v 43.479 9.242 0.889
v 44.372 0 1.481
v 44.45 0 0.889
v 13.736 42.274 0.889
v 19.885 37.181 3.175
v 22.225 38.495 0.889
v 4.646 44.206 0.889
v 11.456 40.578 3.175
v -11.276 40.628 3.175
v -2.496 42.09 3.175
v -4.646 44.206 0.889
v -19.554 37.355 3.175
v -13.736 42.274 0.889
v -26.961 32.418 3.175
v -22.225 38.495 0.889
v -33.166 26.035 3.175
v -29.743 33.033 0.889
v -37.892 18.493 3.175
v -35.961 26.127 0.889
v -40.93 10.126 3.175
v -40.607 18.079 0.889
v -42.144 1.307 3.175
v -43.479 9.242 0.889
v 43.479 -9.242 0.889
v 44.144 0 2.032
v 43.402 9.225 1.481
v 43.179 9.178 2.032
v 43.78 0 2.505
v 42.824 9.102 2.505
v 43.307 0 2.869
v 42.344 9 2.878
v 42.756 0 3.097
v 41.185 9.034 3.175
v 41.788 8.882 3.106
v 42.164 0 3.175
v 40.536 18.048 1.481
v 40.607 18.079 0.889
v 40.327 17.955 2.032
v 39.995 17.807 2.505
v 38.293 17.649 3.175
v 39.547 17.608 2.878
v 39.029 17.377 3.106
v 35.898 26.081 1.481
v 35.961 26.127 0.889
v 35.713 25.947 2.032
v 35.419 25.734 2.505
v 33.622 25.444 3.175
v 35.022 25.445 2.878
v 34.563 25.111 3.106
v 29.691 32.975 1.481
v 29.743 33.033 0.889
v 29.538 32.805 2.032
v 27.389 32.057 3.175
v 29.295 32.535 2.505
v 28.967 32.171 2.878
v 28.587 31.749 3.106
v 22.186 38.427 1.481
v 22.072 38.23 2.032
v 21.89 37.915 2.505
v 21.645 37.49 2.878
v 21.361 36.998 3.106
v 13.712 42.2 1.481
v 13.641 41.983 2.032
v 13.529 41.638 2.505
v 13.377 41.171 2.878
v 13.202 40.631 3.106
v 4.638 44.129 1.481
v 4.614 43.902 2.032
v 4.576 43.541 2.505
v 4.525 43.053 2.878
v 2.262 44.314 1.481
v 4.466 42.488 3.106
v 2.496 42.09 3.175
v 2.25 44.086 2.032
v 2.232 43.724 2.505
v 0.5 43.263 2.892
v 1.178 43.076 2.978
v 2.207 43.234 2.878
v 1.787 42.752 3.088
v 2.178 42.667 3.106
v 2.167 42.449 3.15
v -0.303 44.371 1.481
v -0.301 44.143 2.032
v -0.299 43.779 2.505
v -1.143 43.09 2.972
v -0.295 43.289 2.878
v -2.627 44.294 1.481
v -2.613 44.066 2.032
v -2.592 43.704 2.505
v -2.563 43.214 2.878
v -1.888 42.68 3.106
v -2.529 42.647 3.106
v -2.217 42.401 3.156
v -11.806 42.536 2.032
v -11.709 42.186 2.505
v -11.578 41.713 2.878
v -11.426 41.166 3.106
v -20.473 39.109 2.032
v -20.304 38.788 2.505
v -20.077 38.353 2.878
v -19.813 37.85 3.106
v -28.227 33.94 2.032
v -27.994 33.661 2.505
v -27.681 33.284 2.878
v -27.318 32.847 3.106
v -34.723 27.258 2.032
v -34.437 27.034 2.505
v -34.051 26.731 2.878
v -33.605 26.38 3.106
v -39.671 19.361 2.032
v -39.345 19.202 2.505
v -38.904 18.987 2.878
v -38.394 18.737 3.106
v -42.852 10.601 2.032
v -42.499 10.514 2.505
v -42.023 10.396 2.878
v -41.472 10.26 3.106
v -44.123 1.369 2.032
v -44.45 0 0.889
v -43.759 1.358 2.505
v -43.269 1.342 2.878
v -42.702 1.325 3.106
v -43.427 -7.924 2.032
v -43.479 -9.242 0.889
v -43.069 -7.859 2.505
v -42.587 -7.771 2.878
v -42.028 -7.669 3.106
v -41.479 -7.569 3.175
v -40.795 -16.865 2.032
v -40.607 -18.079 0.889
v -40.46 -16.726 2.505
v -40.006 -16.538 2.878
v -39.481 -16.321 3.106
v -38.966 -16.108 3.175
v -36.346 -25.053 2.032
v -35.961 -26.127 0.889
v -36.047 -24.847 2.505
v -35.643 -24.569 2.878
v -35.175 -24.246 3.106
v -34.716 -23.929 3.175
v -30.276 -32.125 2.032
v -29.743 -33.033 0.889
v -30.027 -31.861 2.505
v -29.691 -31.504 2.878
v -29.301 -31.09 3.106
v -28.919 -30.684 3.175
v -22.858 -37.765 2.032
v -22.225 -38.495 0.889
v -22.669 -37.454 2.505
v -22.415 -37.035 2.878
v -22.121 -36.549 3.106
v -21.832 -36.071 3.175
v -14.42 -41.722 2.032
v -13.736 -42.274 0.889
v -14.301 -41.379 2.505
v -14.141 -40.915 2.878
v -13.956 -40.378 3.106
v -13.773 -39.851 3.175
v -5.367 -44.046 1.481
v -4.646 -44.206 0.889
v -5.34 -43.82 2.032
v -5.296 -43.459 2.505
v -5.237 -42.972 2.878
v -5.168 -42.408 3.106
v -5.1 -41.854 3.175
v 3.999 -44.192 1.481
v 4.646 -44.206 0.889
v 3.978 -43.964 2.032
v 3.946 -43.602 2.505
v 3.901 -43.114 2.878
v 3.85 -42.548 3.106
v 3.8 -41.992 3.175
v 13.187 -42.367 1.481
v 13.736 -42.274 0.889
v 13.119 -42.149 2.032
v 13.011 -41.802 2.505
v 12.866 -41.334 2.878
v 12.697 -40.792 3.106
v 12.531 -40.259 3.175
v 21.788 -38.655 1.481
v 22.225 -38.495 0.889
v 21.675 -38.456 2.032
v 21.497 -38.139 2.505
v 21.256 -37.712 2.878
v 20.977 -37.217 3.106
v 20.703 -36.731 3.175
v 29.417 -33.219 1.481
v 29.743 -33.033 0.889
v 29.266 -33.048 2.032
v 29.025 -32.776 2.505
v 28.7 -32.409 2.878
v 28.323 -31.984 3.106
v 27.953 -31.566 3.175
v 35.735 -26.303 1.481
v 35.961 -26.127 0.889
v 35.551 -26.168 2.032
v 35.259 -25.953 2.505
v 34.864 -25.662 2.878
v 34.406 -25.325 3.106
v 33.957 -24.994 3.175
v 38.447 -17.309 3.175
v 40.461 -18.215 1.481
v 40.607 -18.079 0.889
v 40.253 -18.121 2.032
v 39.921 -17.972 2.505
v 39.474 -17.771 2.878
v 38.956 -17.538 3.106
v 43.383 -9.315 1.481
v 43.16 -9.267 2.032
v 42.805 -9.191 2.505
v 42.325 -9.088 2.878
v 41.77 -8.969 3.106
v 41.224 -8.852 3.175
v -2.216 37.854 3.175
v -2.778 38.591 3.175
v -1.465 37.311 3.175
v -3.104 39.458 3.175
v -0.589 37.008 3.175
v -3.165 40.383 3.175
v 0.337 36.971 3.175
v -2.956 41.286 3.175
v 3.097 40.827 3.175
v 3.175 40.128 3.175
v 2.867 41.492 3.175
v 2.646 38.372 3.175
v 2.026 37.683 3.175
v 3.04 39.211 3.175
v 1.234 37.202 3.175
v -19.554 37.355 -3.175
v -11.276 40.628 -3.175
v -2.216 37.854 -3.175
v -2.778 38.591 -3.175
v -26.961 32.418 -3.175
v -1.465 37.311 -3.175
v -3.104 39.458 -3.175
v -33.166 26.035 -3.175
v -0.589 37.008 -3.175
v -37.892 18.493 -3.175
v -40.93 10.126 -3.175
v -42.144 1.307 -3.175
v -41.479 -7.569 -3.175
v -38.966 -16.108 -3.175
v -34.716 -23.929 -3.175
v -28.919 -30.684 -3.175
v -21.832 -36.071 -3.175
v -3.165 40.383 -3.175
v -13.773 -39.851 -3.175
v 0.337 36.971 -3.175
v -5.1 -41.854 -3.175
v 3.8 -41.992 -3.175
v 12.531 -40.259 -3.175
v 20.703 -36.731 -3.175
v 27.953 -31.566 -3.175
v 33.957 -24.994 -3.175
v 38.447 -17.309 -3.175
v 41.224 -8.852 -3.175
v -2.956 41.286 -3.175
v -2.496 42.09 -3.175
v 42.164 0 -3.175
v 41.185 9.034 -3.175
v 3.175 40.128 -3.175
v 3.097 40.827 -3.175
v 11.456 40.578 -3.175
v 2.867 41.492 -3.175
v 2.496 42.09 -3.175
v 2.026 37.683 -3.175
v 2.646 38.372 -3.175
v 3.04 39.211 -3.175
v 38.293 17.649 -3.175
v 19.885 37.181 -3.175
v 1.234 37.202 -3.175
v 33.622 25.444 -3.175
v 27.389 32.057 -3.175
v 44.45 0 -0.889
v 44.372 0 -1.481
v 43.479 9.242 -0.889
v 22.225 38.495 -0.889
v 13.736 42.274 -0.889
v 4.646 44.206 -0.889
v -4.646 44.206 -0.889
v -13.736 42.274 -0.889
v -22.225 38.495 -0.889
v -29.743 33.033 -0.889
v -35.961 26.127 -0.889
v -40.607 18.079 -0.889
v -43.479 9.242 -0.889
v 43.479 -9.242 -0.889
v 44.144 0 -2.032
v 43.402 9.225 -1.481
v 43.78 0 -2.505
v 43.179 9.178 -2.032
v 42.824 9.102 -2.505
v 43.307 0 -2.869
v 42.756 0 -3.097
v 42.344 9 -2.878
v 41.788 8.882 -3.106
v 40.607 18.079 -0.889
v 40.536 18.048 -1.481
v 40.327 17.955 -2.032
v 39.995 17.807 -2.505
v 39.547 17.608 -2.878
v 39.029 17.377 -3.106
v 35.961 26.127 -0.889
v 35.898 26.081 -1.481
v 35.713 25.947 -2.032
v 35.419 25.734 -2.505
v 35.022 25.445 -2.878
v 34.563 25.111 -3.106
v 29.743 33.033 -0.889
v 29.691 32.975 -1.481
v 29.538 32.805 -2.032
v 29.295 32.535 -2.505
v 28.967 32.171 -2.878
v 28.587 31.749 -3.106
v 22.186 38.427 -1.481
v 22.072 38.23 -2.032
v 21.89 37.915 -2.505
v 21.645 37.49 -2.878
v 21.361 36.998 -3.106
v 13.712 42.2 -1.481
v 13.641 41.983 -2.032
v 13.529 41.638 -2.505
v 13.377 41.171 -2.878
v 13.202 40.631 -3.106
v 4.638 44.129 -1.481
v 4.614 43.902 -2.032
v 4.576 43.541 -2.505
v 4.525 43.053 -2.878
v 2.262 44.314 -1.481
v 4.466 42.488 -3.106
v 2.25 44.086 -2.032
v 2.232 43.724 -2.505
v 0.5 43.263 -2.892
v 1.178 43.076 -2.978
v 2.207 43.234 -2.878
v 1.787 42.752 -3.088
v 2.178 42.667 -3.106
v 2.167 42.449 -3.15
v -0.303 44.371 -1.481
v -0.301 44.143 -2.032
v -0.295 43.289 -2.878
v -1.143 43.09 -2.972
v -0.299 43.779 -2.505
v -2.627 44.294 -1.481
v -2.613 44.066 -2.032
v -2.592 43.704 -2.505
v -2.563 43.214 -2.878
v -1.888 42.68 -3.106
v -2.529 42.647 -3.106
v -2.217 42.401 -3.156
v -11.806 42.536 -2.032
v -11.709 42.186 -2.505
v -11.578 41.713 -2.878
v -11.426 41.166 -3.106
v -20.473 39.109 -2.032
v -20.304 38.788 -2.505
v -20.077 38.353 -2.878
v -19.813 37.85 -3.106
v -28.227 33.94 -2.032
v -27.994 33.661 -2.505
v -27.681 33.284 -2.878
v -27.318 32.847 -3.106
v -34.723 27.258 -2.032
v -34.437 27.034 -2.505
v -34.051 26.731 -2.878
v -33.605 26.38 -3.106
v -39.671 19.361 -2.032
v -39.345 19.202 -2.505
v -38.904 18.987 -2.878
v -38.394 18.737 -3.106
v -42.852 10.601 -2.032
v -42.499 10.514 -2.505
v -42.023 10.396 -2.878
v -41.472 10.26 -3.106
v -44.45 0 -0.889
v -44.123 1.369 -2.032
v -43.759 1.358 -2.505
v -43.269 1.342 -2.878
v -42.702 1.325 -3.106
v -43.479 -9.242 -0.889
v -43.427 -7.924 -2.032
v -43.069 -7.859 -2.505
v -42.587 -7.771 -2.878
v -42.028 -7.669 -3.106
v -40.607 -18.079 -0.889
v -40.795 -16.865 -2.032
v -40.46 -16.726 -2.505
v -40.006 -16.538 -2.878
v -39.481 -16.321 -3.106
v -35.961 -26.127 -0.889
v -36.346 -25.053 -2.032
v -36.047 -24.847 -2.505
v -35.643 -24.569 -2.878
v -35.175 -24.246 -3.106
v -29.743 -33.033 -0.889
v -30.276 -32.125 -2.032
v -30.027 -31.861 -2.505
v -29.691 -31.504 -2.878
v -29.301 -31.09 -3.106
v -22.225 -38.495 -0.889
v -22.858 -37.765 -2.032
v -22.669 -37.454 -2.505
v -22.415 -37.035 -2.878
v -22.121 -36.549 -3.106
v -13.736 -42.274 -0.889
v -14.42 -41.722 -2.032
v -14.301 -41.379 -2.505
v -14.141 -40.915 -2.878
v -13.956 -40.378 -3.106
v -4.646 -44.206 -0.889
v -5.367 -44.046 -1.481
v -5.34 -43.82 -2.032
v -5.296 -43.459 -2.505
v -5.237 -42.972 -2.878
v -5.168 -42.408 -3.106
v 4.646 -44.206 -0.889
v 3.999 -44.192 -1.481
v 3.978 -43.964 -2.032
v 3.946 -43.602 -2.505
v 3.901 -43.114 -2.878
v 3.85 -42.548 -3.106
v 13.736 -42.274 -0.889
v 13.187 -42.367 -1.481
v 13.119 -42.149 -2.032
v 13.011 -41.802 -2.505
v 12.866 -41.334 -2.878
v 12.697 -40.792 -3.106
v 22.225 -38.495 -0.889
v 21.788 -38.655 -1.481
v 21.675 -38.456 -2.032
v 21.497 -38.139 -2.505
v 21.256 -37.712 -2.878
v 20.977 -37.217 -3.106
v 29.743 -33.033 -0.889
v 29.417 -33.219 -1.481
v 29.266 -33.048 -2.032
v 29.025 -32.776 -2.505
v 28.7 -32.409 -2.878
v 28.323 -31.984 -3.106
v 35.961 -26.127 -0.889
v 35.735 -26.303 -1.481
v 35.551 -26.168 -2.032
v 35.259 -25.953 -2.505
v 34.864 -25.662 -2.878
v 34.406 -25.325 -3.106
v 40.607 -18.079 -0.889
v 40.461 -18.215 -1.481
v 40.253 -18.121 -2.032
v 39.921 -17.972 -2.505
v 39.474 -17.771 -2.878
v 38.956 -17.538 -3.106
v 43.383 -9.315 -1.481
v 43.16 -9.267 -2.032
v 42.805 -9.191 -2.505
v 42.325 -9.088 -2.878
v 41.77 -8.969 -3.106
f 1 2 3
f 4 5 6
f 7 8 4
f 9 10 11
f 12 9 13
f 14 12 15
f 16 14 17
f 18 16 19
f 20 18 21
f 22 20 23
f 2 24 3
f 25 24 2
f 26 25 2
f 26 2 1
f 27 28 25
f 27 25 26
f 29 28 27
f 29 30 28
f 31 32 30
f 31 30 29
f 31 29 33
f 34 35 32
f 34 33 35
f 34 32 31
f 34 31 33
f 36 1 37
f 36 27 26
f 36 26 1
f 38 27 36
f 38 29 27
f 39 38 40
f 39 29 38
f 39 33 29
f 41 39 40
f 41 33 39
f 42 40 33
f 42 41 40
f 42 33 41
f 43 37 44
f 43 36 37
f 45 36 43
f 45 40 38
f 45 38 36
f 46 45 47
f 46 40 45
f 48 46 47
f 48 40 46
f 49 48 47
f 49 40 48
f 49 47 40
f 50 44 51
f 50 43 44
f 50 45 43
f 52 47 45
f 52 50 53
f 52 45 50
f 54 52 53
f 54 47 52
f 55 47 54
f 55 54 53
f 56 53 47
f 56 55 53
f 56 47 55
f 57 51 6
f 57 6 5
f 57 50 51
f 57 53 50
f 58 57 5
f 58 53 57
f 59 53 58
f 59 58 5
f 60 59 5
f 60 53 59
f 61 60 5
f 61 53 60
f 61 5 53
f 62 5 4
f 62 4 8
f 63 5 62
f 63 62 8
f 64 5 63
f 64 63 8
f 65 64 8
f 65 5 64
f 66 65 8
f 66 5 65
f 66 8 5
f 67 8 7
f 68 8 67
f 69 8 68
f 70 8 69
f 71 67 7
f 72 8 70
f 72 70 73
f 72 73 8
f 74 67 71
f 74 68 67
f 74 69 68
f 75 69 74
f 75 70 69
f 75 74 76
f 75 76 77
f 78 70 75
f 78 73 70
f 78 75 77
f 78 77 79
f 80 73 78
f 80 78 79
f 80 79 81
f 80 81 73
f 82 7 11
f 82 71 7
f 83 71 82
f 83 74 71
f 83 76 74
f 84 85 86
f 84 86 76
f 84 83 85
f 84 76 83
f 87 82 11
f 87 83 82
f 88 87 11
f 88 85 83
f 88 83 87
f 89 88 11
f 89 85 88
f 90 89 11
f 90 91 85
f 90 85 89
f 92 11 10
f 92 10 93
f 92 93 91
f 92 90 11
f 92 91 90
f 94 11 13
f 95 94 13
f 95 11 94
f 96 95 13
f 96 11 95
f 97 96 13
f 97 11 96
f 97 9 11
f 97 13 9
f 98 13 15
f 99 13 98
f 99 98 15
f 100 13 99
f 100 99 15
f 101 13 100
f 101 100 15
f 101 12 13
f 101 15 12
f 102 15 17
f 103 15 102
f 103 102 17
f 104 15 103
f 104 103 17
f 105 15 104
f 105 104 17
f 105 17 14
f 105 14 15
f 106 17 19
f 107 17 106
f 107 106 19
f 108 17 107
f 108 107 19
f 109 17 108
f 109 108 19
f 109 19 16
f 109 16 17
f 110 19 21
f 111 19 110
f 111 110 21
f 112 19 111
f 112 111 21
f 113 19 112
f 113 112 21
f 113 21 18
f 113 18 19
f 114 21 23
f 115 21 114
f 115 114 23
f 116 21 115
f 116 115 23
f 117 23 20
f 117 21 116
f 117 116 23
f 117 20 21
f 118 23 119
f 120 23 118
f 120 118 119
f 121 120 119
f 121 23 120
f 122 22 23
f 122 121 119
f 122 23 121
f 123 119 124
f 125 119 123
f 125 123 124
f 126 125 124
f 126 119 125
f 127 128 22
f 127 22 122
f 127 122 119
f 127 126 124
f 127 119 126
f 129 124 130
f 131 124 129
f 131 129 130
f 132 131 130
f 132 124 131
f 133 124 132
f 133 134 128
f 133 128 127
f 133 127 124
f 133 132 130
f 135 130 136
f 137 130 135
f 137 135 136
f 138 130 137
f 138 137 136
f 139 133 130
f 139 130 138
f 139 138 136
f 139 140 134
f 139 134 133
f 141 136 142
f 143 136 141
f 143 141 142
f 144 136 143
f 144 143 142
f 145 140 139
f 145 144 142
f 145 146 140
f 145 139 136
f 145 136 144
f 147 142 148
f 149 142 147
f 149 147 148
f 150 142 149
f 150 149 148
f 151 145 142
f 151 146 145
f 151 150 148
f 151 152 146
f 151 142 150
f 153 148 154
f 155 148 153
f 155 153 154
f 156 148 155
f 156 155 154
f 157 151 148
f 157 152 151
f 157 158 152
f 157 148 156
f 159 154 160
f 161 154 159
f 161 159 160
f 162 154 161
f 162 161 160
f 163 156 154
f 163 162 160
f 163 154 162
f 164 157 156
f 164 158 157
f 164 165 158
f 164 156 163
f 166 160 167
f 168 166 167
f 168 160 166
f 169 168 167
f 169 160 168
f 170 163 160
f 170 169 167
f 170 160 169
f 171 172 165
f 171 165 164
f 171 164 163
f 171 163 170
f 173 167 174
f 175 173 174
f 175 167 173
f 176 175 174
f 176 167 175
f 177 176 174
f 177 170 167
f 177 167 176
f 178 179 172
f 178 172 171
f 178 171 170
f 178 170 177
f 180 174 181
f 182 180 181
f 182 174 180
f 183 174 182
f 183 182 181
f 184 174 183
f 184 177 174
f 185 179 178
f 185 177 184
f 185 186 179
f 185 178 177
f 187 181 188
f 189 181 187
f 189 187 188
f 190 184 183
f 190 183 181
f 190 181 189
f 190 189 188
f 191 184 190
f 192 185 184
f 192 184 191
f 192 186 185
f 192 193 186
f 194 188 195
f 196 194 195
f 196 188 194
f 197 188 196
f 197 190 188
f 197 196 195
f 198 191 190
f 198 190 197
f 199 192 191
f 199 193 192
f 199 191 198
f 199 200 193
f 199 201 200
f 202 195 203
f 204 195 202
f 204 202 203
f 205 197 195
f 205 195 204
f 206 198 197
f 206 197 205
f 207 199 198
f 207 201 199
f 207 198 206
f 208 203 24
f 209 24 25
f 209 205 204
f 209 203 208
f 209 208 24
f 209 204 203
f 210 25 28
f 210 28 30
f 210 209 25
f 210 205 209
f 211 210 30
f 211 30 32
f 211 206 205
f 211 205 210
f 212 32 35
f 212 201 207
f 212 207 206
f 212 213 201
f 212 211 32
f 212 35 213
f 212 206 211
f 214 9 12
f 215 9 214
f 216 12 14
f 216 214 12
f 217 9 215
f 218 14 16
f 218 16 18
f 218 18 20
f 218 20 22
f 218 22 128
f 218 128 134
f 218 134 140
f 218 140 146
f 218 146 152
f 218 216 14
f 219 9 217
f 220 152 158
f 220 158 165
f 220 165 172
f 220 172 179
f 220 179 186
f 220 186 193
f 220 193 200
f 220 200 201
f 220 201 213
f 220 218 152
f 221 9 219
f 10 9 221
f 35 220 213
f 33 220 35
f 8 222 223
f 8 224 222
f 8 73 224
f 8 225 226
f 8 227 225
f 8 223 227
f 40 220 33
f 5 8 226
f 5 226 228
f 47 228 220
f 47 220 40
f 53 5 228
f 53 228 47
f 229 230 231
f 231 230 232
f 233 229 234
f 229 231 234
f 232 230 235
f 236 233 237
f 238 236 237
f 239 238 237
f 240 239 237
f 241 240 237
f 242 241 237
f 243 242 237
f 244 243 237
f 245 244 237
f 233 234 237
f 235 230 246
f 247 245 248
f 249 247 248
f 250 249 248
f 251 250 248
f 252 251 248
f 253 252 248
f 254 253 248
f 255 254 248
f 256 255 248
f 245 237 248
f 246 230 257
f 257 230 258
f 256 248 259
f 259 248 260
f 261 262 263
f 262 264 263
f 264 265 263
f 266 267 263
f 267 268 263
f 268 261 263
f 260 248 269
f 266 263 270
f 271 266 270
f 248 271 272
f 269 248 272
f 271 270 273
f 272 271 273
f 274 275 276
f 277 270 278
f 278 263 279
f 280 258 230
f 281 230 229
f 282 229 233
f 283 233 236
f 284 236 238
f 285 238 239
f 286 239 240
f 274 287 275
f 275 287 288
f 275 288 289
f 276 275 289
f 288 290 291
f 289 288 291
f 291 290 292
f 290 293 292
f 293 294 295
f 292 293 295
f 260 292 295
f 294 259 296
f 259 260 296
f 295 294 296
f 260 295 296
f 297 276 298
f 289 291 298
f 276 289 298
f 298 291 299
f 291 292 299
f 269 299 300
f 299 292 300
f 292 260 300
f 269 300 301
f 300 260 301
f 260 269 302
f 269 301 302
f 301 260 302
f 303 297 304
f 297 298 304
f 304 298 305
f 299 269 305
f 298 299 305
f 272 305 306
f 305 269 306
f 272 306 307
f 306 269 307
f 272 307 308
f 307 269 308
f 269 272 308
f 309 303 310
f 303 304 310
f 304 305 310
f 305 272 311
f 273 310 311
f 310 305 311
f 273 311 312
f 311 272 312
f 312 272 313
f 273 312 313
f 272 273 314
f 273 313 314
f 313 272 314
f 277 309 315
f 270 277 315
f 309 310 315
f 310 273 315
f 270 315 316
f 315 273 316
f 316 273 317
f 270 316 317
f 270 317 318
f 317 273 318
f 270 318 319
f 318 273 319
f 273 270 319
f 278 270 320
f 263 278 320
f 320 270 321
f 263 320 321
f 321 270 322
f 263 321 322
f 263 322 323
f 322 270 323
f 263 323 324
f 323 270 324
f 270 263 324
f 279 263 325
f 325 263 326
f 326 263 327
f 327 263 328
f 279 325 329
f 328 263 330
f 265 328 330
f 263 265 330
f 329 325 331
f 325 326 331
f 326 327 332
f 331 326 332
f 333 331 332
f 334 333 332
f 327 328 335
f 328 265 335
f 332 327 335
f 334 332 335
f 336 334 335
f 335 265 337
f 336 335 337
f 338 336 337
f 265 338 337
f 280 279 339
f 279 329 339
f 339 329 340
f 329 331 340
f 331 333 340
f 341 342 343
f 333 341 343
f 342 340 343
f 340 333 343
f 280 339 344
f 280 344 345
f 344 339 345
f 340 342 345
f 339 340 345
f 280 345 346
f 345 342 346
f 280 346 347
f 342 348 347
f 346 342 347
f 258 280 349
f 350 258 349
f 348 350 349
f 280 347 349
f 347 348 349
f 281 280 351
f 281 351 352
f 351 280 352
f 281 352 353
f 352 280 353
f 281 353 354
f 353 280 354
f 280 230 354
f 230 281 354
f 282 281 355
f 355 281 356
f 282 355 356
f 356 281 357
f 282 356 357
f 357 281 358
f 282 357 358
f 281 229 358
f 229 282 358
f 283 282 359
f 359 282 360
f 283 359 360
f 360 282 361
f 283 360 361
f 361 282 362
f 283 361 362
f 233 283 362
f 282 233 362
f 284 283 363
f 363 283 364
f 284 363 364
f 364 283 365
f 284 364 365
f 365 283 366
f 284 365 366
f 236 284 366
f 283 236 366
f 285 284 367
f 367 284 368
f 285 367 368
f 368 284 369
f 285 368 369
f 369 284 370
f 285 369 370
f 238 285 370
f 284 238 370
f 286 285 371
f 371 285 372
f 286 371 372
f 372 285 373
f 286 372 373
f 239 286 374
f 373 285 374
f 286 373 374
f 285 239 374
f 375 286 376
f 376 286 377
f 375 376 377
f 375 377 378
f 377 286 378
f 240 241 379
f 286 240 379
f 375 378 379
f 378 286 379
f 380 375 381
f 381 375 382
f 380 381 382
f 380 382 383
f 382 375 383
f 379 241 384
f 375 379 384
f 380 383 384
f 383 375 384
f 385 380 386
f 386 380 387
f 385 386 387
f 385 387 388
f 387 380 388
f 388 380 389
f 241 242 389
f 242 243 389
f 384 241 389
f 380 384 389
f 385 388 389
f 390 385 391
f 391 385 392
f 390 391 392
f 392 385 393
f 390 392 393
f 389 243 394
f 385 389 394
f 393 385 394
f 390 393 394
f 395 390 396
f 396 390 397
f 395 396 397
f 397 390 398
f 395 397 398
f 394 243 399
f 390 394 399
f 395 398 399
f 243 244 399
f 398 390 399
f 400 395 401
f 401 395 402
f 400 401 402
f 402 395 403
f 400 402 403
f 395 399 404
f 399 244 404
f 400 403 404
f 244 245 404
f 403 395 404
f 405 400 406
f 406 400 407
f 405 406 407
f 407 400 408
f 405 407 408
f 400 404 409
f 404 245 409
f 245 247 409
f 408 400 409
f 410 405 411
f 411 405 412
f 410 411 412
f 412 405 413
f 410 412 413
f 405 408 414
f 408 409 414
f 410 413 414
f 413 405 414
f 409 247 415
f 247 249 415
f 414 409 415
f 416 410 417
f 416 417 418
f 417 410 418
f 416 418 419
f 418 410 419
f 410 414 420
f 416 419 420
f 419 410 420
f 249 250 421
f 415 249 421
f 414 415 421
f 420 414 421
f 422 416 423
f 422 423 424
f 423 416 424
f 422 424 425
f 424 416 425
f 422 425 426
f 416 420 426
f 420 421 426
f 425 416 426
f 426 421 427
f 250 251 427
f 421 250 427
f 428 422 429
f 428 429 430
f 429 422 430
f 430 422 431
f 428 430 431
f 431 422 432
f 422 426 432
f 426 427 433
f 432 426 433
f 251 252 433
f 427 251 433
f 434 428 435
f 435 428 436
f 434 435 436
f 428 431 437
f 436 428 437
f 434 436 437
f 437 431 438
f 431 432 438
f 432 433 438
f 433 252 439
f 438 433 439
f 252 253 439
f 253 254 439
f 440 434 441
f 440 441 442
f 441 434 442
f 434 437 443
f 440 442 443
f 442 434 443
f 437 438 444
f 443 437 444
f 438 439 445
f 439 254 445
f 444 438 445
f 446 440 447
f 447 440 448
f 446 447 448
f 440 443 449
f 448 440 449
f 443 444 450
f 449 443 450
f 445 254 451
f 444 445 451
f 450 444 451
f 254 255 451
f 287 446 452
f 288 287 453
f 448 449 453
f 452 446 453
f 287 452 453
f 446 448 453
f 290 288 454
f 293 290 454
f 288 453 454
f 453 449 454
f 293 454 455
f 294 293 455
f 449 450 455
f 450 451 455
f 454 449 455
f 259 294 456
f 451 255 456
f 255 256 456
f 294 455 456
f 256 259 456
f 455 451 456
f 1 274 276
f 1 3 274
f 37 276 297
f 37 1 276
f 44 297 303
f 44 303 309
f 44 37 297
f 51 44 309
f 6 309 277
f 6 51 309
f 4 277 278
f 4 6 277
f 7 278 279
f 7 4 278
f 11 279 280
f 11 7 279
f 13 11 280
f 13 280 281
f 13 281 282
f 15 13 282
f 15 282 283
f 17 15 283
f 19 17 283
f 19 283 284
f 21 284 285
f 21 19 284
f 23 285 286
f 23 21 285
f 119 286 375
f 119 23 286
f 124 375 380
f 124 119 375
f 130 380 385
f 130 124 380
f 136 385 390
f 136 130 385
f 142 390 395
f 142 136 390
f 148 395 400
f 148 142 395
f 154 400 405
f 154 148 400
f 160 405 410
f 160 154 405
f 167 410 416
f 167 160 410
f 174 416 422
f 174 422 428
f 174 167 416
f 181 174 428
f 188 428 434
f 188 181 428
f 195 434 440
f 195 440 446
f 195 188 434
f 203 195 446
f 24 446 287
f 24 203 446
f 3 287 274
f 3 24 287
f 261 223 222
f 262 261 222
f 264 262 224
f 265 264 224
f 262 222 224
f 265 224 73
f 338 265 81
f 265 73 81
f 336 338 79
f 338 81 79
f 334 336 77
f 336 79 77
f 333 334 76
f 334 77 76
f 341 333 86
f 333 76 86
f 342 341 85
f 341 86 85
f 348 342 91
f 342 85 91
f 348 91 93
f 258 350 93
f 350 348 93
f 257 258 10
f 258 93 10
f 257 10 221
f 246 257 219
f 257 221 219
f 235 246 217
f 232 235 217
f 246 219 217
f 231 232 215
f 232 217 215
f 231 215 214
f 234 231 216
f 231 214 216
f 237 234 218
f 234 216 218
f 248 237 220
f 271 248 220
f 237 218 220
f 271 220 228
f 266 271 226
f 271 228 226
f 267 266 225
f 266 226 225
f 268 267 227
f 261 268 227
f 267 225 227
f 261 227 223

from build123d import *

# Parameters (mm, degrees)
F0_R     = 44.45
F1_DEPTH = 3.175
F2_R     = 3.175
F3_DEPTH = 12.7


# Not quite as in the source:
# - a fillet or chamfer that OpenCascade refuses, or shapes differently, is made with other operations: its cross-section is extruded or revolved along the edge and cut away or added


with BuildPart() as f1:
    # F0 (on Top) → F1 (new body, symmetric)
    with BuildSketch(Plane.XY):
        Circle(F0_R)
    extrude(amount=F1_DEPTH, both=True)

    # F2 (on Top) → F3 (cut, symmetric)
    with BuildSketch(Plane.XY):
        with Locations((0, 40.1277458341)):
            Circle(F2_R)
    extrude(amount=F3_DEPTH, both=True, mode=Mode.SUBTRACT)

    # F4: fillet of radius 2.286 on 2 edges, made by hand

    # F4_s1 → F4_t2 (revolve, cut)
    with BuildSketch(Plane.XZ):
        with BuildLine():
            ThreePointArc((44.45, 0.889), (43.7804461018, 2.5054461018), (42.164, 3.175))
            Line((42.164, 3.175), (44.45, 3.175))
            Line((44.45, 3.175), (44.45, 0.889))
        make_face()
    revolve(axis=Axis((0, 0, 3.175), (0, 0, 1)), mode=Mode.SUBTRACT)

    # F4_s3 → F4_t4 (revolve, cut)
    with BuildSketch(Plane.XZ):
        with BuildLine():
            ThreePointArc((44.45, -0.889), (43.7804461018, -2.5054461018), (42.164, -3.175))
            Line((42.164, -3.175), (44.45, -3.175))
            Line((44.45, -3.175), (44.45, -0.889))
        make_face()
    revolve(axis=Axis((0, 0, -3.175), (0, 0, 1)), mode=Mode.SUBTRACT)


solid = f1.part
